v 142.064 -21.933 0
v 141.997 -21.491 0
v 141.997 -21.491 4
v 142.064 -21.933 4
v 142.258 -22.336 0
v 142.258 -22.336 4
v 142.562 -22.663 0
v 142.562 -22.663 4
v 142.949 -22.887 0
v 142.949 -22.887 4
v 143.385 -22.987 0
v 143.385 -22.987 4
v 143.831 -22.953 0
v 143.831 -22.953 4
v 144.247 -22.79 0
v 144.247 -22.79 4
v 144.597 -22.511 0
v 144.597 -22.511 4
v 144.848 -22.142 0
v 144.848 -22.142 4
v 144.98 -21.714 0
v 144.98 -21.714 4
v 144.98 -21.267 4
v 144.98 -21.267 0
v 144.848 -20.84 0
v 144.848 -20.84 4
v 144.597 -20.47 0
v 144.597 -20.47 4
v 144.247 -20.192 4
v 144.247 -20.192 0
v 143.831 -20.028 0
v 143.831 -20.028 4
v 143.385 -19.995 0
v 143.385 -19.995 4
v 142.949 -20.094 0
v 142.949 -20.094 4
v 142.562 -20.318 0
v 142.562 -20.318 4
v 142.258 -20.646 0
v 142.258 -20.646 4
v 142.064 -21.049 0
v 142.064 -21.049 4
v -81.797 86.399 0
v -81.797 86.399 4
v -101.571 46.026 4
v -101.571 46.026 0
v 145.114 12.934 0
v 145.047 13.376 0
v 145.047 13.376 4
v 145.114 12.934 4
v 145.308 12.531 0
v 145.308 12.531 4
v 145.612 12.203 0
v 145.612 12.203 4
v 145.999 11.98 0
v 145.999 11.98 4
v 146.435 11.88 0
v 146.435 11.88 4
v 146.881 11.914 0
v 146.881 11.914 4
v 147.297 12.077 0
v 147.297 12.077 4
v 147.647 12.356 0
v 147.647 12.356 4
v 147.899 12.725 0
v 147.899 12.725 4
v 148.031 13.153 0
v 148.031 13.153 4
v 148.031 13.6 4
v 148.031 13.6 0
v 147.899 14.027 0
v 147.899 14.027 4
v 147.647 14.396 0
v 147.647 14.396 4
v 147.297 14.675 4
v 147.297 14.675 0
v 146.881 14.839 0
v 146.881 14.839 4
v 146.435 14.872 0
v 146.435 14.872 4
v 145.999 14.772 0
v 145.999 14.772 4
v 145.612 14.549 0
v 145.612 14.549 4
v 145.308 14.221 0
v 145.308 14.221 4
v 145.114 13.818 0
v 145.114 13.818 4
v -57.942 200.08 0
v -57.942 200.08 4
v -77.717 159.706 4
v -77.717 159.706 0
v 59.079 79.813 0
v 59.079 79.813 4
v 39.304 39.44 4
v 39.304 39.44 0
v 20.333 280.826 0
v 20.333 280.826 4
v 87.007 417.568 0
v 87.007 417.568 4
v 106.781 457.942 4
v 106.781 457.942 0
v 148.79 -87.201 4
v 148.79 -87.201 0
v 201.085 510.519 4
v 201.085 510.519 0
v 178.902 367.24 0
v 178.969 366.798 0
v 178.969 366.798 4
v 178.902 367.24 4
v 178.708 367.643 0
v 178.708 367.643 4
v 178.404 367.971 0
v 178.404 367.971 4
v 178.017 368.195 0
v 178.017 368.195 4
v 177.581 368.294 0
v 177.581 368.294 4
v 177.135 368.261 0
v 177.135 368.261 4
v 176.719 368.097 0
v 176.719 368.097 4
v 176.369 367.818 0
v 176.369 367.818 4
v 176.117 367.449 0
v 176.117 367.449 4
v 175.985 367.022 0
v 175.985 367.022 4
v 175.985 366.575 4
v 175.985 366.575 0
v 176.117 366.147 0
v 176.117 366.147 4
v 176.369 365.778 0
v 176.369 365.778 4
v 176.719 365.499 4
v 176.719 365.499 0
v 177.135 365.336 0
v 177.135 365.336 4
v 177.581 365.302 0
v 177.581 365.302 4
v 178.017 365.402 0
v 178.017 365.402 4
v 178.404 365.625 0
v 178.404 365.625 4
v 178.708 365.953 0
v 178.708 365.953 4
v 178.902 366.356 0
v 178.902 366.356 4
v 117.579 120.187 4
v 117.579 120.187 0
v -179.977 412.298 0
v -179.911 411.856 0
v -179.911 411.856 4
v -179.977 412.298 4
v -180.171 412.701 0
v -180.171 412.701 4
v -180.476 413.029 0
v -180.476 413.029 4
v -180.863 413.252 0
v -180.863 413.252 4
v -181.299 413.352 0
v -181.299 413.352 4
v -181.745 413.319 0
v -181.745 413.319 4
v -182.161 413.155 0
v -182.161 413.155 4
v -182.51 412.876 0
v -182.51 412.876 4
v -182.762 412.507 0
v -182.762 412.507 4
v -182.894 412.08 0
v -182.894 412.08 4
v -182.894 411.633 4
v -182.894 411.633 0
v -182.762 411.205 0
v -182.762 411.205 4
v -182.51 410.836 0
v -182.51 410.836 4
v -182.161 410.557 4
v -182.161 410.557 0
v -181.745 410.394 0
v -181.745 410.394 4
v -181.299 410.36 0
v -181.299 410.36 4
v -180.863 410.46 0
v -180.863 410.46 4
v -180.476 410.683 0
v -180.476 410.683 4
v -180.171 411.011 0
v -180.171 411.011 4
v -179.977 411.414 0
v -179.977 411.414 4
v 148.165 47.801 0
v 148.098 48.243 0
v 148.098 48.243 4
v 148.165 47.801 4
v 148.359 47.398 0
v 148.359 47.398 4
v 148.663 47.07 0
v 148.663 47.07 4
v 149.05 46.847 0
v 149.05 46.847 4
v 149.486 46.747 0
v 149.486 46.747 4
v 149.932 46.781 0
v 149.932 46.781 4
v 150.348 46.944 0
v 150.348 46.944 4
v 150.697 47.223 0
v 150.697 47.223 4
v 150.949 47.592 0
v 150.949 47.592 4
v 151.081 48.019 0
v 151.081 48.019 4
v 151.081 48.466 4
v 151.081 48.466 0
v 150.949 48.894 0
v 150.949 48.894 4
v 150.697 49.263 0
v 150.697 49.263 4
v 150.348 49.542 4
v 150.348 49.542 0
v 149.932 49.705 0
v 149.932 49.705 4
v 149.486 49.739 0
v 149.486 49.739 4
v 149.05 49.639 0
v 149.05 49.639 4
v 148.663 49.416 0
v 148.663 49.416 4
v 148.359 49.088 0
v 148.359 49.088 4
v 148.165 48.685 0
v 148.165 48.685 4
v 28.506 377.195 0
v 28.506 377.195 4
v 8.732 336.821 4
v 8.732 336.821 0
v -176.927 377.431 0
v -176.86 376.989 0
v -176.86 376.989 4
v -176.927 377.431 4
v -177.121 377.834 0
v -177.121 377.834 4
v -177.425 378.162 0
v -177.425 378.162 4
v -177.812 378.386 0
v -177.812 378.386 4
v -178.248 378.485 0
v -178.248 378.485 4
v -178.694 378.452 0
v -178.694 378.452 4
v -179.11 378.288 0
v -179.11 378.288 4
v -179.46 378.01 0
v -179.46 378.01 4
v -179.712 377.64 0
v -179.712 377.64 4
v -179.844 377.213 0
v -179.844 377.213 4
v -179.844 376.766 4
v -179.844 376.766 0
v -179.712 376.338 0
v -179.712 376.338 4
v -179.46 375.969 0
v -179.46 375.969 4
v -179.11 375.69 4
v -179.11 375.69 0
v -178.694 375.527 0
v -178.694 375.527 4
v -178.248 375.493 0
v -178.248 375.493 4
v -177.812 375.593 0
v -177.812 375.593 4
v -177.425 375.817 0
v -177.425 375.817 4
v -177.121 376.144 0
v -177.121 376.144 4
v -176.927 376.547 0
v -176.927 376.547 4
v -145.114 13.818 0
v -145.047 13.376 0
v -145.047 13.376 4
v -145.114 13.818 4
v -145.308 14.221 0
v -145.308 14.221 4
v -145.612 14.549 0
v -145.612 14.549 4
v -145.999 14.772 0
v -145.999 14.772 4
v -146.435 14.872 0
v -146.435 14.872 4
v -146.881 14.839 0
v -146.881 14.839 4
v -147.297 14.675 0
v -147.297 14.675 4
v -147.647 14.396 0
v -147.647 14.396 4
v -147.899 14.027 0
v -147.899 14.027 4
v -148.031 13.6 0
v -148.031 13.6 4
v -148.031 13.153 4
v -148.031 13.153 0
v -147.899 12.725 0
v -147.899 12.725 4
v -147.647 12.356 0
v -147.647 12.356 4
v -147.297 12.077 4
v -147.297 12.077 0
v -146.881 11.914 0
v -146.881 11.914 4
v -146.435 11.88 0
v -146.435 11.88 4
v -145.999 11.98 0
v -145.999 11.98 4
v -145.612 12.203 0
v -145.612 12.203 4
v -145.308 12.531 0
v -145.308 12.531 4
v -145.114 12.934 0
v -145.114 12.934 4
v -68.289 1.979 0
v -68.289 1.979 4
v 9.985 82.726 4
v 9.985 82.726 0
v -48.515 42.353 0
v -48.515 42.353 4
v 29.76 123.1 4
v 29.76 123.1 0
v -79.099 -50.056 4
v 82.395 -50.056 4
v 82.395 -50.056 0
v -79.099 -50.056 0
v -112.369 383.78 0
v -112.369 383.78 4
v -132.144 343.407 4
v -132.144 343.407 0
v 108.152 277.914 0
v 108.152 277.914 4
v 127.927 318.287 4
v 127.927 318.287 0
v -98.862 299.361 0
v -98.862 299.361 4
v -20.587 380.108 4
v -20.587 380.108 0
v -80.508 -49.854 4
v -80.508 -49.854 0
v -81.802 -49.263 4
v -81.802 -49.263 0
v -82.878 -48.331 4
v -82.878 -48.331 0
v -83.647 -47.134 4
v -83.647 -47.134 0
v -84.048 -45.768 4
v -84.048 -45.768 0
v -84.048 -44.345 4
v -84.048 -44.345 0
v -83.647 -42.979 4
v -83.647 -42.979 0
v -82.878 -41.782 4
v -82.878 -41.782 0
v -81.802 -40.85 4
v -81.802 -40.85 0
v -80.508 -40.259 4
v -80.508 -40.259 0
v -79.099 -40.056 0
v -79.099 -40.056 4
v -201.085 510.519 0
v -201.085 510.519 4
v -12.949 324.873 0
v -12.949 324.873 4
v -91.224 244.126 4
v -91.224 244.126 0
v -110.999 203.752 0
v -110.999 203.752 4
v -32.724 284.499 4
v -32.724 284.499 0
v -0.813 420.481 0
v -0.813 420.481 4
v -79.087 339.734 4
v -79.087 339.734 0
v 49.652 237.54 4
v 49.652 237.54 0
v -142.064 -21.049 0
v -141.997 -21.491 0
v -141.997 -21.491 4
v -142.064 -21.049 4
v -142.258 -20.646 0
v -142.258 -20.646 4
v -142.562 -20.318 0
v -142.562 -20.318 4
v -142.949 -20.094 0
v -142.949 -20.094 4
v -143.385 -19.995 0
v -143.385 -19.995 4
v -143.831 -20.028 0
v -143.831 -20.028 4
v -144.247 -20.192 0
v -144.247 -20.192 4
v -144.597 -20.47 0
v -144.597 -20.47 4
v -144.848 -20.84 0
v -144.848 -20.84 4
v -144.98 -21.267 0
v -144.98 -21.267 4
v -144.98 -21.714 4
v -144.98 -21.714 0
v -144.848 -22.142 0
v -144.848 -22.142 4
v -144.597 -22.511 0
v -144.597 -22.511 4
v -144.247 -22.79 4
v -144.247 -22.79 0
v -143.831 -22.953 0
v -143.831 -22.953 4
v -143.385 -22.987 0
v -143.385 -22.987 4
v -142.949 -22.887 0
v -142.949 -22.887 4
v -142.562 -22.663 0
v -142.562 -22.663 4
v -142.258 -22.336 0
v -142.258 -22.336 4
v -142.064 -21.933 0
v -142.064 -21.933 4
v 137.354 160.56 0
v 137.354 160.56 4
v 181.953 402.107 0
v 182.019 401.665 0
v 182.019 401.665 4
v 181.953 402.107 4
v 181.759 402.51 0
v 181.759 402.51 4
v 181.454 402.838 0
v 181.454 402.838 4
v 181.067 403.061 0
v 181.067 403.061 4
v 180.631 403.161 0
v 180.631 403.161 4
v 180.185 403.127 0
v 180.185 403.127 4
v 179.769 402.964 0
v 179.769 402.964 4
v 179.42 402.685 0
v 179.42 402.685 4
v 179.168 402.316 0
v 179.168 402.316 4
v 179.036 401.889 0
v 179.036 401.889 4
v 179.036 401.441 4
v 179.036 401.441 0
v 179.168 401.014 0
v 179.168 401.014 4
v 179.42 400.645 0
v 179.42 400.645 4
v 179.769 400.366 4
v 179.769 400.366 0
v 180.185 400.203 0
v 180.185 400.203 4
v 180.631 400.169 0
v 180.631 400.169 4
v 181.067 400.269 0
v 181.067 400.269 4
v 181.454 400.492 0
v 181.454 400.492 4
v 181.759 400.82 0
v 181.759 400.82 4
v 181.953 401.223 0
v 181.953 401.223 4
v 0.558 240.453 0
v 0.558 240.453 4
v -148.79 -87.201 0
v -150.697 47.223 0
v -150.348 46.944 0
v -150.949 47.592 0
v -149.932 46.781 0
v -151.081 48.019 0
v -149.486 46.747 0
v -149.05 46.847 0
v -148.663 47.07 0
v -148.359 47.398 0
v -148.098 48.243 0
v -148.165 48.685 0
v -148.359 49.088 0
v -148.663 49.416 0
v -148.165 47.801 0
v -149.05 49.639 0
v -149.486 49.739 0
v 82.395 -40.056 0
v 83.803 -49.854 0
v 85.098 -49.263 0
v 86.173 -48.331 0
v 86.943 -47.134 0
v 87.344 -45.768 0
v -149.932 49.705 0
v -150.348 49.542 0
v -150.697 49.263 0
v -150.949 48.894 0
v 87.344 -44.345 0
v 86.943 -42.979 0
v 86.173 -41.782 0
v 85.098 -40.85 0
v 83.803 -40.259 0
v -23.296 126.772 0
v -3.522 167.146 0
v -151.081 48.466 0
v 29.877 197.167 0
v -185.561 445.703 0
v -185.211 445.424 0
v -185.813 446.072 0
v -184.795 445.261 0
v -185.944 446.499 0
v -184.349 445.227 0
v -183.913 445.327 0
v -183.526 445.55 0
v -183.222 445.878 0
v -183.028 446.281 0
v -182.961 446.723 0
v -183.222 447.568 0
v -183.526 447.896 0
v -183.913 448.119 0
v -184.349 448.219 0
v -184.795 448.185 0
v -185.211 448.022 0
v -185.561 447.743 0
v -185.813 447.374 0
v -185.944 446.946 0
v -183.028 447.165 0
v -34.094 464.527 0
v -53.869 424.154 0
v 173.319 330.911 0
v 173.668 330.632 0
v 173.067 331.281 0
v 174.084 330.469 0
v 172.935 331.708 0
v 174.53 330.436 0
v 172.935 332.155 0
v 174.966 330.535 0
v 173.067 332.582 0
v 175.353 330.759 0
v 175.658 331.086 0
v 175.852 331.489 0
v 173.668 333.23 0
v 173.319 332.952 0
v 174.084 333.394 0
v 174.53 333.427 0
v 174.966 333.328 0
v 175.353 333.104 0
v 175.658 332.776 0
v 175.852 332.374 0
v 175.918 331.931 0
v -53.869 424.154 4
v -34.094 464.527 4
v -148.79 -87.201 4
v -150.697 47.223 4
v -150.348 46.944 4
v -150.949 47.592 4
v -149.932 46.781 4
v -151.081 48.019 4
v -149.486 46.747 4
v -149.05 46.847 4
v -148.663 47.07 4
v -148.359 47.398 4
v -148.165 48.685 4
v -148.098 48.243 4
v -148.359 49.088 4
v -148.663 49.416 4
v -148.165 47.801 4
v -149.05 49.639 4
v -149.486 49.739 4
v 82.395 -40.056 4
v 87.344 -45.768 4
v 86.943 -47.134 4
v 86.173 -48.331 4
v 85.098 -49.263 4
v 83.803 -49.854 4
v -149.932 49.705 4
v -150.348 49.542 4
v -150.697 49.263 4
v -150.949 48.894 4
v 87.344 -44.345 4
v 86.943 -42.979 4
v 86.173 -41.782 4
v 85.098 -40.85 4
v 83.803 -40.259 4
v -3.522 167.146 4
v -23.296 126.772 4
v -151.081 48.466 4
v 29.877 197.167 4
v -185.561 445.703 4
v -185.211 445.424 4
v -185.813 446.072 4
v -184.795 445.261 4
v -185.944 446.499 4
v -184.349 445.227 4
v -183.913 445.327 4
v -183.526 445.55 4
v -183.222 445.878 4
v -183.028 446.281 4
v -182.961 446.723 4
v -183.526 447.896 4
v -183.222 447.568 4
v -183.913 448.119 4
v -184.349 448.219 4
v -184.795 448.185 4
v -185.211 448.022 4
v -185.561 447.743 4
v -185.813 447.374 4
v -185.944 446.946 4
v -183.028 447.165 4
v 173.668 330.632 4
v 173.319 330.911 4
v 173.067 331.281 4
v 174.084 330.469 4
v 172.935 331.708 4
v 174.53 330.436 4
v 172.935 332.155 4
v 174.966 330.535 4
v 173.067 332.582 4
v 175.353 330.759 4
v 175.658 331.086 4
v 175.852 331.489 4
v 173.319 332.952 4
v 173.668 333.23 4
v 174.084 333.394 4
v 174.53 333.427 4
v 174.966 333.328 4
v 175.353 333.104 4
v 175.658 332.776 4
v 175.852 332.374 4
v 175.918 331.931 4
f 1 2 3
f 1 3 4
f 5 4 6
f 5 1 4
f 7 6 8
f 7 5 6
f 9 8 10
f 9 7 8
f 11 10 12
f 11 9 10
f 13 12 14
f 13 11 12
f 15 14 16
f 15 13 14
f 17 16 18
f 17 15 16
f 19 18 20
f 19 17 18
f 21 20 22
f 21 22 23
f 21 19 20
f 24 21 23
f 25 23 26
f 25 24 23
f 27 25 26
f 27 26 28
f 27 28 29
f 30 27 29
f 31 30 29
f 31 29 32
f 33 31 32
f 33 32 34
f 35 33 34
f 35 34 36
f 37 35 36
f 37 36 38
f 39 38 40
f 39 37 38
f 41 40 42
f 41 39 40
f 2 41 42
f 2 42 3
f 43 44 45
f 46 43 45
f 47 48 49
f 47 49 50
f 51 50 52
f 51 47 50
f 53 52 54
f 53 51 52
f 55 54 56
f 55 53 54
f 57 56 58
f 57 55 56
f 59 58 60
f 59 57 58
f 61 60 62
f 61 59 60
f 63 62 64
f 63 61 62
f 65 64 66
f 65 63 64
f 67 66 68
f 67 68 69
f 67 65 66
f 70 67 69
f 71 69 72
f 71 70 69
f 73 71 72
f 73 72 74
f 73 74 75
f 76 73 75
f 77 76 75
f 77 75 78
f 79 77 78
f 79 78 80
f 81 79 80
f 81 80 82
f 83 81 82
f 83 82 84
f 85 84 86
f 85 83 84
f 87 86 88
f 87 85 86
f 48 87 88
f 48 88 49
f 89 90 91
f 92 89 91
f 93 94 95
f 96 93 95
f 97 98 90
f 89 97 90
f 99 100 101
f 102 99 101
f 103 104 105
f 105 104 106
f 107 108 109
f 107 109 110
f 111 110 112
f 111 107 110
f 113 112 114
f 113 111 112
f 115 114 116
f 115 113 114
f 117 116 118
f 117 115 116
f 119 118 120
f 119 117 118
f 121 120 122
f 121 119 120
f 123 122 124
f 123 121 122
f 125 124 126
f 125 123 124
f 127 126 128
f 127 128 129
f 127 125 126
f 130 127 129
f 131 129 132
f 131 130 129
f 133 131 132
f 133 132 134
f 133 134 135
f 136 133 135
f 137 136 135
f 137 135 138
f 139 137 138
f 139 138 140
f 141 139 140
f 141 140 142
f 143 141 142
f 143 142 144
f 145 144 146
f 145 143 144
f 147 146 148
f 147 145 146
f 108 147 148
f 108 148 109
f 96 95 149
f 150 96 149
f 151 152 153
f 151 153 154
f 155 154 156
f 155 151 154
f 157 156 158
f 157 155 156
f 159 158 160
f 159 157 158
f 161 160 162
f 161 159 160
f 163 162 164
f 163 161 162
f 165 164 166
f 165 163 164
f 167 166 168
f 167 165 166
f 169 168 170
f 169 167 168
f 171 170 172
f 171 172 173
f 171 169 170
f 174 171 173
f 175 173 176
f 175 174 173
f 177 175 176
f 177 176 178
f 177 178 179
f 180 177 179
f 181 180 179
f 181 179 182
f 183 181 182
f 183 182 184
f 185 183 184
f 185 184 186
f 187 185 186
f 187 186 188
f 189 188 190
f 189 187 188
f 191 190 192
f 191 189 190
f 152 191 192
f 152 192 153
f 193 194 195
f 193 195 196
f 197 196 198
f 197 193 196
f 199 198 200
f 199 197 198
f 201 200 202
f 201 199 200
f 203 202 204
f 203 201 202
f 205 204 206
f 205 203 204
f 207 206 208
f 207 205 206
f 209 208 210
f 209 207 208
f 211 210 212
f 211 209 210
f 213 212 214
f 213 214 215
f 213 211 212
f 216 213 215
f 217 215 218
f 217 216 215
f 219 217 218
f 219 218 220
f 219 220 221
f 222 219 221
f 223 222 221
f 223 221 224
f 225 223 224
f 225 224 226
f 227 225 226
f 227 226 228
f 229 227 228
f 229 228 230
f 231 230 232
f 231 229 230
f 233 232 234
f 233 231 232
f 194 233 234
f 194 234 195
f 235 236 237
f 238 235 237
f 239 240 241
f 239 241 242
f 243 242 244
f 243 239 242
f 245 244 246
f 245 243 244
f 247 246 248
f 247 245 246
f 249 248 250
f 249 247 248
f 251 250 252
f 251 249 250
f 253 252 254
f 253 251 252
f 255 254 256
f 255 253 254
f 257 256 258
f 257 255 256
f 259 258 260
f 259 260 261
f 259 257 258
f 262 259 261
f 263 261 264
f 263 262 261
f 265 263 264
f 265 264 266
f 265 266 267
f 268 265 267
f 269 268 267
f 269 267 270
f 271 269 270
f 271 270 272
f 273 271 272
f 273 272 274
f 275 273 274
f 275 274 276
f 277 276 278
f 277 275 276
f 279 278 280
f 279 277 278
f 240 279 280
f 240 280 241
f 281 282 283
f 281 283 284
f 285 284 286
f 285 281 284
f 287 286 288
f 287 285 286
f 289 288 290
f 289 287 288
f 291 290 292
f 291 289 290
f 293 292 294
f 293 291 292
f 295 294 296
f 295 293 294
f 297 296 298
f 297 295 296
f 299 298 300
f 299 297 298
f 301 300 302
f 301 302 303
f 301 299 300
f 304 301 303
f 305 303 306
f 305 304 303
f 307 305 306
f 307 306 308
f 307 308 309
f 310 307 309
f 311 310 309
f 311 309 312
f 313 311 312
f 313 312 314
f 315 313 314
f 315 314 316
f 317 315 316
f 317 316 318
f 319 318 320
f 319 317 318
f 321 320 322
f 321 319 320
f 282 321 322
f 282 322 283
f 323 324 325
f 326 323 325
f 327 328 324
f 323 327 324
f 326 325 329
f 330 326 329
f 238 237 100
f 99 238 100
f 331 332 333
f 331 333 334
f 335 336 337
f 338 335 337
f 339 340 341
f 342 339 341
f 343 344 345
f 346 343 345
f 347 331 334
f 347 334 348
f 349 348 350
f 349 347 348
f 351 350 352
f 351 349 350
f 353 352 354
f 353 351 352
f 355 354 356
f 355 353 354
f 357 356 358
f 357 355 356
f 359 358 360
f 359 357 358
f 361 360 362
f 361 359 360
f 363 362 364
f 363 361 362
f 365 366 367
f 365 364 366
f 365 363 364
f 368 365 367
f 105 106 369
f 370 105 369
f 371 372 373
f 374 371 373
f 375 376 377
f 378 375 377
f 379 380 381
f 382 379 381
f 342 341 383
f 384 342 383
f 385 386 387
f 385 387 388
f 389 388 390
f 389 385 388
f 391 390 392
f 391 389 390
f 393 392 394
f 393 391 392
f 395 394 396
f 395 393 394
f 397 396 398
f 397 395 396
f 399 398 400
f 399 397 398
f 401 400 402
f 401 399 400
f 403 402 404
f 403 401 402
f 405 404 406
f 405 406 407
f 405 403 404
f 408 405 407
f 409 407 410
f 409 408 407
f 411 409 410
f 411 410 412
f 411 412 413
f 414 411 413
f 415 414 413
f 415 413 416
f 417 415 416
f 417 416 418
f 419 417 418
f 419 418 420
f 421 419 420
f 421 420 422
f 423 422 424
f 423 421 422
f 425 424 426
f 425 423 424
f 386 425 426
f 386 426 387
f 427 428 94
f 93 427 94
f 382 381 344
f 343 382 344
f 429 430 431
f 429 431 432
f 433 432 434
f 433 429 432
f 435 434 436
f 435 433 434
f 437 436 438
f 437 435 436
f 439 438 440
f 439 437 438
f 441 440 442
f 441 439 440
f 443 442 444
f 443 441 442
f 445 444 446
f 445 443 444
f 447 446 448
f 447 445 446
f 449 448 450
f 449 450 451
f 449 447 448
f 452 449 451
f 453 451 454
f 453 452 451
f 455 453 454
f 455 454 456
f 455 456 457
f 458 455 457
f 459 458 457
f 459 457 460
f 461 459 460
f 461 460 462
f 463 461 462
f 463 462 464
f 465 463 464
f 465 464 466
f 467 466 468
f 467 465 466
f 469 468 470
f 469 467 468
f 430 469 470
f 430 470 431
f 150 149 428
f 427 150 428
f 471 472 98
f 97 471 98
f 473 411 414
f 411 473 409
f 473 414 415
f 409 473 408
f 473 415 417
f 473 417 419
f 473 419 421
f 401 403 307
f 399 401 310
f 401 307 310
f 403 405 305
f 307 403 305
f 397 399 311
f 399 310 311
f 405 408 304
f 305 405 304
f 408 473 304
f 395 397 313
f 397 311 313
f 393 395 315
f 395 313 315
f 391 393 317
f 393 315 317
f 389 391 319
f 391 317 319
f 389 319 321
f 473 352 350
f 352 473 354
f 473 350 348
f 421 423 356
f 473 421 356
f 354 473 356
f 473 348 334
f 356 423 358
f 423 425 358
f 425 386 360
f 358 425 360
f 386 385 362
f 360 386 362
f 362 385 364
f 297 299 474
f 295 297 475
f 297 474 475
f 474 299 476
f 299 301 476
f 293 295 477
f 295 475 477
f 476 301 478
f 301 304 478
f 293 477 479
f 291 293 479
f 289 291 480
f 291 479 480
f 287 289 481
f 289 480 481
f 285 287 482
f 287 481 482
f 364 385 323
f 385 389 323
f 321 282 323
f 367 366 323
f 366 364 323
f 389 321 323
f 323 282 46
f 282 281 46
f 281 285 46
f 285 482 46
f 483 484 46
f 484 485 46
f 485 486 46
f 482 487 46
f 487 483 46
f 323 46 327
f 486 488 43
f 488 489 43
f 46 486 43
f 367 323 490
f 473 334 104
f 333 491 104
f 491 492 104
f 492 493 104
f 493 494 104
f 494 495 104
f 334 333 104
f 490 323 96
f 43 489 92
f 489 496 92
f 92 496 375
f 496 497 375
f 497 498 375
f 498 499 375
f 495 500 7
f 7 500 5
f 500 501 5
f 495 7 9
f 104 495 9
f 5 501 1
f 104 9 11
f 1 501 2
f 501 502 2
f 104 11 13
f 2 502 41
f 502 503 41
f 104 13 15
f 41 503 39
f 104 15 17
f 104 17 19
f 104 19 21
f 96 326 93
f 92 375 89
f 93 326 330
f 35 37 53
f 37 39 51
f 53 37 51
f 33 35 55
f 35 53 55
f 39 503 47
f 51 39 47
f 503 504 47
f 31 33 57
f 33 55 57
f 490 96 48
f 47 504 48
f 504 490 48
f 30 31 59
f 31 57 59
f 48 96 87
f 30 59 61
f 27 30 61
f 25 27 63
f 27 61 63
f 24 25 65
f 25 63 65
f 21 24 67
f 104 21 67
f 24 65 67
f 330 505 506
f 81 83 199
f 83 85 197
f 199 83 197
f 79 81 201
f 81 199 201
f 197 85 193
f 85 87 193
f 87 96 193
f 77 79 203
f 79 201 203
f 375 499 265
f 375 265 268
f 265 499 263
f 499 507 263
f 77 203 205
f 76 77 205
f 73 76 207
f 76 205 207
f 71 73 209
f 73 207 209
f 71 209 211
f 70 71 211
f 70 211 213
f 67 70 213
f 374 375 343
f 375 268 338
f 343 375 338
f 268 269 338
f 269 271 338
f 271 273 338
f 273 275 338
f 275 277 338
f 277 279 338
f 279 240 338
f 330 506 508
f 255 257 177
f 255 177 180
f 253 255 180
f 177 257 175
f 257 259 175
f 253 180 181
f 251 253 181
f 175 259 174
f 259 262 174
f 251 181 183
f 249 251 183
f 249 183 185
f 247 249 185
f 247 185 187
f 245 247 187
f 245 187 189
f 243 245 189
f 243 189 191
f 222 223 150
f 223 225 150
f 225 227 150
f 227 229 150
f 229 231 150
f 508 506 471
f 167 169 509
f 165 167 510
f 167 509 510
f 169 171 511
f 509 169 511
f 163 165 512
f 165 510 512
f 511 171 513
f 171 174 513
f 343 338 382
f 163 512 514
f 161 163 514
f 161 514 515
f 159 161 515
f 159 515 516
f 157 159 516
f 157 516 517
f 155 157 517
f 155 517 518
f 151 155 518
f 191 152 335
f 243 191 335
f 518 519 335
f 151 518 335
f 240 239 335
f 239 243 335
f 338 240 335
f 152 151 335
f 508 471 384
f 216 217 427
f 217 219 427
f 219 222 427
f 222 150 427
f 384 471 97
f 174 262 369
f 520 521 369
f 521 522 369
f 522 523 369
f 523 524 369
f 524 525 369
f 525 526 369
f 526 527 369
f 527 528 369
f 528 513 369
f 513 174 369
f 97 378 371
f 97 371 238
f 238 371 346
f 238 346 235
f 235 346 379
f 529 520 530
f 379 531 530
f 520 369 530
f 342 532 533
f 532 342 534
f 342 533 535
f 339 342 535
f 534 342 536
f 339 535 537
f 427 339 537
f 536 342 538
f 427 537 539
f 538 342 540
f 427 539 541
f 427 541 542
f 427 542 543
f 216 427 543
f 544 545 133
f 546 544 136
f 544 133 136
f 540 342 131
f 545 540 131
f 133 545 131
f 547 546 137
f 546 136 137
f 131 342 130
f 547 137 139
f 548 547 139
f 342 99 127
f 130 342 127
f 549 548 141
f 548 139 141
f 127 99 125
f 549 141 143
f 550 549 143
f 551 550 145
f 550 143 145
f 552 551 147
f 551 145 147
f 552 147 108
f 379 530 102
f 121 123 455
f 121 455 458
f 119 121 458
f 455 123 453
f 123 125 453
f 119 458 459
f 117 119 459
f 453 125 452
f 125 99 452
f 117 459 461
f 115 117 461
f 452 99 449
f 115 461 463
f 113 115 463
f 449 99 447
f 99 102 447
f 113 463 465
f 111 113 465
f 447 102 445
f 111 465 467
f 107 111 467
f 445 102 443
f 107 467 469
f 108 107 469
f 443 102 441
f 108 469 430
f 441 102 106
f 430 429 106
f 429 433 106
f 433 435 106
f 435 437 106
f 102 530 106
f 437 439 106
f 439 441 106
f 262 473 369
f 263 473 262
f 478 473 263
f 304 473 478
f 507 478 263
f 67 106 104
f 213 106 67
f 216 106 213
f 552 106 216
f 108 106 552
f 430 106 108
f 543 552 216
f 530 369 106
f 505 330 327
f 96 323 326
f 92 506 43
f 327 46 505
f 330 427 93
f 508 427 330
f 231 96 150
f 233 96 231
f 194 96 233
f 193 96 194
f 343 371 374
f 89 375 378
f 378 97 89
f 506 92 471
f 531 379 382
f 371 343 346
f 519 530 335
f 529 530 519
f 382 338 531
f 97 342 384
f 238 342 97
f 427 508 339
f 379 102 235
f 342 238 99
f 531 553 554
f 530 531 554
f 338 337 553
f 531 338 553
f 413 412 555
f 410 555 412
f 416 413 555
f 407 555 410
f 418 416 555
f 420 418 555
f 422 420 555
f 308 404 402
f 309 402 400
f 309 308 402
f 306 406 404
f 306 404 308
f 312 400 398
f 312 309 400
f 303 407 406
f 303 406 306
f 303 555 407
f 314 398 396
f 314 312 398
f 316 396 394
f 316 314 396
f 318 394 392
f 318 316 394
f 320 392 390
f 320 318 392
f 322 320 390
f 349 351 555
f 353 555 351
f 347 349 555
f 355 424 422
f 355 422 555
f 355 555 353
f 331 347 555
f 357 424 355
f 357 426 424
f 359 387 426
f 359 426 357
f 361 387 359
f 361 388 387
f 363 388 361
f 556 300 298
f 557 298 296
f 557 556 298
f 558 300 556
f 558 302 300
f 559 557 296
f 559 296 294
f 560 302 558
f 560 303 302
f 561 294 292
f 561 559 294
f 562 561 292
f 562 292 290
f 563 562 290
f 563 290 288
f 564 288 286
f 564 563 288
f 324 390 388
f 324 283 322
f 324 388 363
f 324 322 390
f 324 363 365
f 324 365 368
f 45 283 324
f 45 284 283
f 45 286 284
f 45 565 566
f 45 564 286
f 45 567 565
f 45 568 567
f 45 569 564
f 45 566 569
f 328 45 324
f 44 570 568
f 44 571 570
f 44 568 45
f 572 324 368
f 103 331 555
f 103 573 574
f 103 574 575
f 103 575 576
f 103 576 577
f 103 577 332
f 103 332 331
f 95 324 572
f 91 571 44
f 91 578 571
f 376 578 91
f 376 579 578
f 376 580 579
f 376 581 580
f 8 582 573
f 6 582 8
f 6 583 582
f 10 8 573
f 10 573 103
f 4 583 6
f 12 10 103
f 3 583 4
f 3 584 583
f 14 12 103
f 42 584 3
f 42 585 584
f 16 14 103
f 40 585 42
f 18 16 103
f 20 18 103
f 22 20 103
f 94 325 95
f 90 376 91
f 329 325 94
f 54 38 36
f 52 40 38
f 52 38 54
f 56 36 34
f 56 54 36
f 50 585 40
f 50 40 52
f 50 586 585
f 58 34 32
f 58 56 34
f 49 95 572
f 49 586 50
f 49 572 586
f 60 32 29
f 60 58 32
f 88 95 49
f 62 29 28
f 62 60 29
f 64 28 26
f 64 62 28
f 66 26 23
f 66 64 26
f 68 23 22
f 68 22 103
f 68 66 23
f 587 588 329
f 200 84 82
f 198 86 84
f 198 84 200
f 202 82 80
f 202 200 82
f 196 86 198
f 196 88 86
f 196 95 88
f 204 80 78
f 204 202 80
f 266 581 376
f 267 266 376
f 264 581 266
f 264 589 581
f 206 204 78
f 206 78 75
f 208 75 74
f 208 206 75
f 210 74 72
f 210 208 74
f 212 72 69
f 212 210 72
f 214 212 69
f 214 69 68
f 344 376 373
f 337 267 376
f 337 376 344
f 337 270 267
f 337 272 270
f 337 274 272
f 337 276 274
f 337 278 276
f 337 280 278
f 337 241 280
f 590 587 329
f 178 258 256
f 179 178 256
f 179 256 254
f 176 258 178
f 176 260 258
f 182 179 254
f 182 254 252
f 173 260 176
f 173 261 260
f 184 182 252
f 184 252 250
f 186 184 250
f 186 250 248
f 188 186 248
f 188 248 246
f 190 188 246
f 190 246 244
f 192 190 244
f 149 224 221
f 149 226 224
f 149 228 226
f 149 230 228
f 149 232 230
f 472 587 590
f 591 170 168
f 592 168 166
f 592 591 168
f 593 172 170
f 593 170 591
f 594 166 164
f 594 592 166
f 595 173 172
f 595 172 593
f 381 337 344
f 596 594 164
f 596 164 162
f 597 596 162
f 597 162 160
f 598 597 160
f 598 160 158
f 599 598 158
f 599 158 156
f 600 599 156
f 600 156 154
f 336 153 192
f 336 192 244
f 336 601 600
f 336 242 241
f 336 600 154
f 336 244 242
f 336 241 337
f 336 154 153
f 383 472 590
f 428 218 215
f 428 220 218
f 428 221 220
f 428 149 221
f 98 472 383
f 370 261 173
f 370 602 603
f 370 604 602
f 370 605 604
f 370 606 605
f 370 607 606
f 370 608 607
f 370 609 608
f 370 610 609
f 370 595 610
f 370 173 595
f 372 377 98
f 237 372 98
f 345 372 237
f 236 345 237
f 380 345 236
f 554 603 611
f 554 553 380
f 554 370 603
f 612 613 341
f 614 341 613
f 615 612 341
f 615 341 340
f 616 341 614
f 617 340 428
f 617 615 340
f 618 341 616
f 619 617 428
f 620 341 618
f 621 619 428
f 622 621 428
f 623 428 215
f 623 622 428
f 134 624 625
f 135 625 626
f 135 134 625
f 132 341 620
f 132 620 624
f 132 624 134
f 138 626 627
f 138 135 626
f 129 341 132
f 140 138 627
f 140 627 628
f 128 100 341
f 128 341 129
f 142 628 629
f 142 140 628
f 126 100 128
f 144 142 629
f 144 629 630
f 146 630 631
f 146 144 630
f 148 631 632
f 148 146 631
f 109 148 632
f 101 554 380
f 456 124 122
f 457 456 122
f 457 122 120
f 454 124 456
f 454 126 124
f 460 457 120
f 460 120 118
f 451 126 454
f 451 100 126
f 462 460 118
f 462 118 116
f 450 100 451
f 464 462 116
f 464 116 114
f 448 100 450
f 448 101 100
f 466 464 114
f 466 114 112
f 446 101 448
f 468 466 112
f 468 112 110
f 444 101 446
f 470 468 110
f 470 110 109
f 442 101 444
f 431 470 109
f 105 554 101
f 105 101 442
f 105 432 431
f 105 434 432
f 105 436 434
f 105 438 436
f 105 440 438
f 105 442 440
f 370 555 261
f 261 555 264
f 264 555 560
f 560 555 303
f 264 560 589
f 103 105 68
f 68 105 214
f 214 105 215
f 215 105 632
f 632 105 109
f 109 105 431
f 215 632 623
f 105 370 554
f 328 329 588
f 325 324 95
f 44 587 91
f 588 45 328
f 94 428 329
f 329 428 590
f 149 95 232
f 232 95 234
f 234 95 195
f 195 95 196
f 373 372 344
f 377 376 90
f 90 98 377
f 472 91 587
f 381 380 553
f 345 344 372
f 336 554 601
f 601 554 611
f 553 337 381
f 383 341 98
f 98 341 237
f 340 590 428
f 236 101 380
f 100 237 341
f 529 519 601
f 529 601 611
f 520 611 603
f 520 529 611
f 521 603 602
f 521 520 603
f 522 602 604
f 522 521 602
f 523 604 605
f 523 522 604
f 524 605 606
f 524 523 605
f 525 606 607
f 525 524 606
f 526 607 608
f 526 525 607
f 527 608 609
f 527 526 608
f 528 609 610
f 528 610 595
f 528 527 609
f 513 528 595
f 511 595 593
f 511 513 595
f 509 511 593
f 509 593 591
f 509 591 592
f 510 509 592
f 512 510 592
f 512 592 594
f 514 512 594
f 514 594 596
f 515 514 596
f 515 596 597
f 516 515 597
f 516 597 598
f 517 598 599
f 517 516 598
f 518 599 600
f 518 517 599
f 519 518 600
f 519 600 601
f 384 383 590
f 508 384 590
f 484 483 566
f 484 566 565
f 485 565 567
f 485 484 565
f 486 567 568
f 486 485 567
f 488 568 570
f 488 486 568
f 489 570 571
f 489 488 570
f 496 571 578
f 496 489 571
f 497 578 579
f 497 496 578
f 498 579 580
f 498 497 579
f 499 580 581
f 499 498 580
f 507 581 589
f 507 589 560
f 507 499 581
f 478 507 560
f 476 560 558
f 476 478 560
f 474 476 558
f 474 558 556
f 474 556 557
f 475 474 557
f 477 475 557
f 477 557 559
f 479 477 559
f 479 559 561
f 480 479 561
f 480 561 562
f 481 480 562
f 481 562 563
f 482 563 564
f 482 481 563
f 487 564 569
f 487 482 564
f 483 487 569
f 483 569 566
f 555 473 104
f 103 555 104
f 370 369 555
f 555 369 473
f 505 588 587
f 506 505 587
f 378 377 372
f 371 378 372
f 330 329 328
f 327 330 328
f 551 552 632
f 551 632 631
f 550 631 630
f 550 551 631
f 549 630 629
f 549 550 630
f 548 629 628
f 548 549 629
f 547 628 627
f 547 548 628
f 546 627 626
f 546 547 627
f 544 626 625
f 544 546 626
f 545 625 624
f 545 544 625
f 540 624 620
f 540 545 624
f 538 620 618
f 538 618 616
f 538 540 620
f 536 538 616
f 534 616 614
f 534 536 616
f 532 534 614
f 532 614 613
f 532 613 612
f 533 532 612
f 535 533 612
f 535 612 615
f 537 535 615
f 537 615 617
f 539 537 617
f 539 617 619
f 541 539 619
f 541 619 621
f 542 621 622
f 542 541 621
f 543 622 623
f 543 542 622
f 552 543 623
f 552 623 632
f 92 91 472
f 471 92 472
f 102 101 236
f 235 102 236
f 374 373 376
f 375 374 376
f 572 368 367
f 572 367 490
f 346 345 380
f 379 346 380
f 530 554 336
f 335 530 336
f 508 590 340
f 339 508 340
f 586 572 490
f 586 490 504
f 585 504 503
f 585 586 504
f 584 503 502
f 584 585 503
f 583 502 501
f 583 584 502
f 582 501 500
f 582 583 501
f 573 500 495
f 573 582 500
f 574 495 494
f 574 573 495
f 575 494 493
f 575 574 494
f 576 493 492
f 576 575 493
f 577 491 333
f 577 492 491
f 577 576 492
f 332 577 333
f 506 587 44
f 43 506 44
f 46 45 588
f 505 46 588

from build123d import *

# Parameters (mm, degrees)
SKETCH2_R           = 1.5
BOSS_EXTRUDE1_DEPTH = 4
CUT_EXTRUDE1_DEPTH  = 10
CUT_EXTRUDE2_DEPTH  = 10


with BuildPart() as part:
    # Sketch2 → Boss-Extrude1 (new body)
    with BuildSketch(Plane.XY):
        Polygon((-201.085, 510.519303279), (-148.79, -87.200696721), (148.79, -87.200696721), (201.085, 510.519303279), align=None)
        with Locations((-143.497000101, -21.490696721)):
            Circle(SKETCH2_R, mode=Mode.SUBTRACT)
        with Locations((-146.547451097, 13.376117712)):
            Circle(SKETCH2_R, mode=Mode.SUBTRACT)
        with Locations((-149.597902093, 48.242932145)):
            Circle(SKETCH2_R, mode=Mode.SUBTRACT)
        with Locations((-178.360333434, 376.989303279)):
            Circle(SKETCH2_R, mode=Mode.SUBTRACT)
        with Locations((-181.410784431, 411.856117712)):
            Circle(SKETCH2_R, mode=Mode.SUBTRACT)
        with Locations((-184.461235427, 446.722932145)):
            Circle(SKETCH2_R, mode=Mode.SUBTRACT)
        with Locations(Location((143.497000101, -21.490696721, 0), (0, 0, 180))):
            Circle(SKETCH2_R, mode=Mode.SUBTRACT)
        with Locations(Location((146.547451097, 13.376117712, 0), (0, 0, 180))):
            Circle(SKETCH2_R, mode=Mode.SUBTRACT)
        with Locations(Location((149.597902093, 48.242932145, 0), (0, 0, 180))):
            Circle(SKETCH2_R, mode=Mode.SUBTRACT)
        with Locations((180.519233461, 401.665041377)):
            Circle(SKETCH2_R, mode=Mode.SUBTRACT)
        with Locations((177.468708595, 366.798233406)):
            Circle(SKETCH2_R, mode=Mode.SUBTRACT)
        with Locations((174.418183729, 331.931425436)):
            Circle(SKETCH2_R, mode=Mode.SUBTRACT)
    extrude(amount=BOSS_EXTRUDE1_DEPTH)

    # Sketch4 → Cut-Extrude1 (cut)
    with BuildSketch(Plane.XY.offset(4)):
        Polygon((-34.094299882, 464.527144648), (-112.369249077, 383.780354951), (-132.143973084, 343.406960103), (-53.869023889, 424.153749799), align=None)
        Polygon((-0.812513571, 420.480908047), (-79.087462766, 339.73411835), (-98.862186773, 299.360723502), (-20.587237578, 380.107513199), align=None)
        Polygon((106.781302599, 457.941673616), (28.506353404, 377.19488392), (8.731629397, 336.821489072), (87.006578592, 417.568278768), align=None)
        Polygon((-12.949090157, 324.872537818), (-91.224039352, 244.125748122), (-110.99876336, 203.752353274), (-32.723814164, 284.49914297), align=None)
        Polygon((20.332696154, 280.826301217), (-57.942253041, 200.079511521), (-77.716977049, 159.706116673), (0.557972147, 240.452906369), align=None)
        Polygon((127.926512324, 318.287066787), (49.651563128, 237.54027709), (29.876839121, 197.166882242), (108.151788317, 277.913671939), align=None)
        Polygon((-3.521579741, 167.145743121), (-81.796528937, 86.398953425), (-101.571252944, 46.025558577), (-23.296303748, 126.772348273), align=None)
        Polygon((29.76020657, 123.09950652), (-48.514742626, 42.352716824), (-68.289466633, 1.979321976), (9.985482563, 82.726111672), align=None)
        Polygon((137.35402274, 160.560272089), (59.079073544, 79.813482393), (39.304349537, 39.440087545), (117.579298732, 120.186877241), align=None)
    extrude(amount=-CUT_EXTRUDE1_DEPTH, mode=Mode.SUBTRACT)

    # Sketch5 → Cut-Extrude2 (cut)
    with BuildSketch(Plane.XY.offset(4)):
        with BuildLine():
            Line((-79.098896029, -40.056454397), (82.394683364, -40.056454397))
            ThreePointArc((82.394683364, -40.056454397), (87.394683364, -45.056454397), (82.394683364, -50.056454397))
            Line((82.394683364, -50.056454397), (-79.098896029, -50.056454397))
            ThreePointArc((-79.098896029, -50.056454397), (-84.098896029, -45.056454397), (-79.098896029, -40.056454397))
        make_face()
    extrude(amount=-CUT_EXTRUDE2_DEPTH, mode=Mode.SUBTRACT)


solid = part.part
